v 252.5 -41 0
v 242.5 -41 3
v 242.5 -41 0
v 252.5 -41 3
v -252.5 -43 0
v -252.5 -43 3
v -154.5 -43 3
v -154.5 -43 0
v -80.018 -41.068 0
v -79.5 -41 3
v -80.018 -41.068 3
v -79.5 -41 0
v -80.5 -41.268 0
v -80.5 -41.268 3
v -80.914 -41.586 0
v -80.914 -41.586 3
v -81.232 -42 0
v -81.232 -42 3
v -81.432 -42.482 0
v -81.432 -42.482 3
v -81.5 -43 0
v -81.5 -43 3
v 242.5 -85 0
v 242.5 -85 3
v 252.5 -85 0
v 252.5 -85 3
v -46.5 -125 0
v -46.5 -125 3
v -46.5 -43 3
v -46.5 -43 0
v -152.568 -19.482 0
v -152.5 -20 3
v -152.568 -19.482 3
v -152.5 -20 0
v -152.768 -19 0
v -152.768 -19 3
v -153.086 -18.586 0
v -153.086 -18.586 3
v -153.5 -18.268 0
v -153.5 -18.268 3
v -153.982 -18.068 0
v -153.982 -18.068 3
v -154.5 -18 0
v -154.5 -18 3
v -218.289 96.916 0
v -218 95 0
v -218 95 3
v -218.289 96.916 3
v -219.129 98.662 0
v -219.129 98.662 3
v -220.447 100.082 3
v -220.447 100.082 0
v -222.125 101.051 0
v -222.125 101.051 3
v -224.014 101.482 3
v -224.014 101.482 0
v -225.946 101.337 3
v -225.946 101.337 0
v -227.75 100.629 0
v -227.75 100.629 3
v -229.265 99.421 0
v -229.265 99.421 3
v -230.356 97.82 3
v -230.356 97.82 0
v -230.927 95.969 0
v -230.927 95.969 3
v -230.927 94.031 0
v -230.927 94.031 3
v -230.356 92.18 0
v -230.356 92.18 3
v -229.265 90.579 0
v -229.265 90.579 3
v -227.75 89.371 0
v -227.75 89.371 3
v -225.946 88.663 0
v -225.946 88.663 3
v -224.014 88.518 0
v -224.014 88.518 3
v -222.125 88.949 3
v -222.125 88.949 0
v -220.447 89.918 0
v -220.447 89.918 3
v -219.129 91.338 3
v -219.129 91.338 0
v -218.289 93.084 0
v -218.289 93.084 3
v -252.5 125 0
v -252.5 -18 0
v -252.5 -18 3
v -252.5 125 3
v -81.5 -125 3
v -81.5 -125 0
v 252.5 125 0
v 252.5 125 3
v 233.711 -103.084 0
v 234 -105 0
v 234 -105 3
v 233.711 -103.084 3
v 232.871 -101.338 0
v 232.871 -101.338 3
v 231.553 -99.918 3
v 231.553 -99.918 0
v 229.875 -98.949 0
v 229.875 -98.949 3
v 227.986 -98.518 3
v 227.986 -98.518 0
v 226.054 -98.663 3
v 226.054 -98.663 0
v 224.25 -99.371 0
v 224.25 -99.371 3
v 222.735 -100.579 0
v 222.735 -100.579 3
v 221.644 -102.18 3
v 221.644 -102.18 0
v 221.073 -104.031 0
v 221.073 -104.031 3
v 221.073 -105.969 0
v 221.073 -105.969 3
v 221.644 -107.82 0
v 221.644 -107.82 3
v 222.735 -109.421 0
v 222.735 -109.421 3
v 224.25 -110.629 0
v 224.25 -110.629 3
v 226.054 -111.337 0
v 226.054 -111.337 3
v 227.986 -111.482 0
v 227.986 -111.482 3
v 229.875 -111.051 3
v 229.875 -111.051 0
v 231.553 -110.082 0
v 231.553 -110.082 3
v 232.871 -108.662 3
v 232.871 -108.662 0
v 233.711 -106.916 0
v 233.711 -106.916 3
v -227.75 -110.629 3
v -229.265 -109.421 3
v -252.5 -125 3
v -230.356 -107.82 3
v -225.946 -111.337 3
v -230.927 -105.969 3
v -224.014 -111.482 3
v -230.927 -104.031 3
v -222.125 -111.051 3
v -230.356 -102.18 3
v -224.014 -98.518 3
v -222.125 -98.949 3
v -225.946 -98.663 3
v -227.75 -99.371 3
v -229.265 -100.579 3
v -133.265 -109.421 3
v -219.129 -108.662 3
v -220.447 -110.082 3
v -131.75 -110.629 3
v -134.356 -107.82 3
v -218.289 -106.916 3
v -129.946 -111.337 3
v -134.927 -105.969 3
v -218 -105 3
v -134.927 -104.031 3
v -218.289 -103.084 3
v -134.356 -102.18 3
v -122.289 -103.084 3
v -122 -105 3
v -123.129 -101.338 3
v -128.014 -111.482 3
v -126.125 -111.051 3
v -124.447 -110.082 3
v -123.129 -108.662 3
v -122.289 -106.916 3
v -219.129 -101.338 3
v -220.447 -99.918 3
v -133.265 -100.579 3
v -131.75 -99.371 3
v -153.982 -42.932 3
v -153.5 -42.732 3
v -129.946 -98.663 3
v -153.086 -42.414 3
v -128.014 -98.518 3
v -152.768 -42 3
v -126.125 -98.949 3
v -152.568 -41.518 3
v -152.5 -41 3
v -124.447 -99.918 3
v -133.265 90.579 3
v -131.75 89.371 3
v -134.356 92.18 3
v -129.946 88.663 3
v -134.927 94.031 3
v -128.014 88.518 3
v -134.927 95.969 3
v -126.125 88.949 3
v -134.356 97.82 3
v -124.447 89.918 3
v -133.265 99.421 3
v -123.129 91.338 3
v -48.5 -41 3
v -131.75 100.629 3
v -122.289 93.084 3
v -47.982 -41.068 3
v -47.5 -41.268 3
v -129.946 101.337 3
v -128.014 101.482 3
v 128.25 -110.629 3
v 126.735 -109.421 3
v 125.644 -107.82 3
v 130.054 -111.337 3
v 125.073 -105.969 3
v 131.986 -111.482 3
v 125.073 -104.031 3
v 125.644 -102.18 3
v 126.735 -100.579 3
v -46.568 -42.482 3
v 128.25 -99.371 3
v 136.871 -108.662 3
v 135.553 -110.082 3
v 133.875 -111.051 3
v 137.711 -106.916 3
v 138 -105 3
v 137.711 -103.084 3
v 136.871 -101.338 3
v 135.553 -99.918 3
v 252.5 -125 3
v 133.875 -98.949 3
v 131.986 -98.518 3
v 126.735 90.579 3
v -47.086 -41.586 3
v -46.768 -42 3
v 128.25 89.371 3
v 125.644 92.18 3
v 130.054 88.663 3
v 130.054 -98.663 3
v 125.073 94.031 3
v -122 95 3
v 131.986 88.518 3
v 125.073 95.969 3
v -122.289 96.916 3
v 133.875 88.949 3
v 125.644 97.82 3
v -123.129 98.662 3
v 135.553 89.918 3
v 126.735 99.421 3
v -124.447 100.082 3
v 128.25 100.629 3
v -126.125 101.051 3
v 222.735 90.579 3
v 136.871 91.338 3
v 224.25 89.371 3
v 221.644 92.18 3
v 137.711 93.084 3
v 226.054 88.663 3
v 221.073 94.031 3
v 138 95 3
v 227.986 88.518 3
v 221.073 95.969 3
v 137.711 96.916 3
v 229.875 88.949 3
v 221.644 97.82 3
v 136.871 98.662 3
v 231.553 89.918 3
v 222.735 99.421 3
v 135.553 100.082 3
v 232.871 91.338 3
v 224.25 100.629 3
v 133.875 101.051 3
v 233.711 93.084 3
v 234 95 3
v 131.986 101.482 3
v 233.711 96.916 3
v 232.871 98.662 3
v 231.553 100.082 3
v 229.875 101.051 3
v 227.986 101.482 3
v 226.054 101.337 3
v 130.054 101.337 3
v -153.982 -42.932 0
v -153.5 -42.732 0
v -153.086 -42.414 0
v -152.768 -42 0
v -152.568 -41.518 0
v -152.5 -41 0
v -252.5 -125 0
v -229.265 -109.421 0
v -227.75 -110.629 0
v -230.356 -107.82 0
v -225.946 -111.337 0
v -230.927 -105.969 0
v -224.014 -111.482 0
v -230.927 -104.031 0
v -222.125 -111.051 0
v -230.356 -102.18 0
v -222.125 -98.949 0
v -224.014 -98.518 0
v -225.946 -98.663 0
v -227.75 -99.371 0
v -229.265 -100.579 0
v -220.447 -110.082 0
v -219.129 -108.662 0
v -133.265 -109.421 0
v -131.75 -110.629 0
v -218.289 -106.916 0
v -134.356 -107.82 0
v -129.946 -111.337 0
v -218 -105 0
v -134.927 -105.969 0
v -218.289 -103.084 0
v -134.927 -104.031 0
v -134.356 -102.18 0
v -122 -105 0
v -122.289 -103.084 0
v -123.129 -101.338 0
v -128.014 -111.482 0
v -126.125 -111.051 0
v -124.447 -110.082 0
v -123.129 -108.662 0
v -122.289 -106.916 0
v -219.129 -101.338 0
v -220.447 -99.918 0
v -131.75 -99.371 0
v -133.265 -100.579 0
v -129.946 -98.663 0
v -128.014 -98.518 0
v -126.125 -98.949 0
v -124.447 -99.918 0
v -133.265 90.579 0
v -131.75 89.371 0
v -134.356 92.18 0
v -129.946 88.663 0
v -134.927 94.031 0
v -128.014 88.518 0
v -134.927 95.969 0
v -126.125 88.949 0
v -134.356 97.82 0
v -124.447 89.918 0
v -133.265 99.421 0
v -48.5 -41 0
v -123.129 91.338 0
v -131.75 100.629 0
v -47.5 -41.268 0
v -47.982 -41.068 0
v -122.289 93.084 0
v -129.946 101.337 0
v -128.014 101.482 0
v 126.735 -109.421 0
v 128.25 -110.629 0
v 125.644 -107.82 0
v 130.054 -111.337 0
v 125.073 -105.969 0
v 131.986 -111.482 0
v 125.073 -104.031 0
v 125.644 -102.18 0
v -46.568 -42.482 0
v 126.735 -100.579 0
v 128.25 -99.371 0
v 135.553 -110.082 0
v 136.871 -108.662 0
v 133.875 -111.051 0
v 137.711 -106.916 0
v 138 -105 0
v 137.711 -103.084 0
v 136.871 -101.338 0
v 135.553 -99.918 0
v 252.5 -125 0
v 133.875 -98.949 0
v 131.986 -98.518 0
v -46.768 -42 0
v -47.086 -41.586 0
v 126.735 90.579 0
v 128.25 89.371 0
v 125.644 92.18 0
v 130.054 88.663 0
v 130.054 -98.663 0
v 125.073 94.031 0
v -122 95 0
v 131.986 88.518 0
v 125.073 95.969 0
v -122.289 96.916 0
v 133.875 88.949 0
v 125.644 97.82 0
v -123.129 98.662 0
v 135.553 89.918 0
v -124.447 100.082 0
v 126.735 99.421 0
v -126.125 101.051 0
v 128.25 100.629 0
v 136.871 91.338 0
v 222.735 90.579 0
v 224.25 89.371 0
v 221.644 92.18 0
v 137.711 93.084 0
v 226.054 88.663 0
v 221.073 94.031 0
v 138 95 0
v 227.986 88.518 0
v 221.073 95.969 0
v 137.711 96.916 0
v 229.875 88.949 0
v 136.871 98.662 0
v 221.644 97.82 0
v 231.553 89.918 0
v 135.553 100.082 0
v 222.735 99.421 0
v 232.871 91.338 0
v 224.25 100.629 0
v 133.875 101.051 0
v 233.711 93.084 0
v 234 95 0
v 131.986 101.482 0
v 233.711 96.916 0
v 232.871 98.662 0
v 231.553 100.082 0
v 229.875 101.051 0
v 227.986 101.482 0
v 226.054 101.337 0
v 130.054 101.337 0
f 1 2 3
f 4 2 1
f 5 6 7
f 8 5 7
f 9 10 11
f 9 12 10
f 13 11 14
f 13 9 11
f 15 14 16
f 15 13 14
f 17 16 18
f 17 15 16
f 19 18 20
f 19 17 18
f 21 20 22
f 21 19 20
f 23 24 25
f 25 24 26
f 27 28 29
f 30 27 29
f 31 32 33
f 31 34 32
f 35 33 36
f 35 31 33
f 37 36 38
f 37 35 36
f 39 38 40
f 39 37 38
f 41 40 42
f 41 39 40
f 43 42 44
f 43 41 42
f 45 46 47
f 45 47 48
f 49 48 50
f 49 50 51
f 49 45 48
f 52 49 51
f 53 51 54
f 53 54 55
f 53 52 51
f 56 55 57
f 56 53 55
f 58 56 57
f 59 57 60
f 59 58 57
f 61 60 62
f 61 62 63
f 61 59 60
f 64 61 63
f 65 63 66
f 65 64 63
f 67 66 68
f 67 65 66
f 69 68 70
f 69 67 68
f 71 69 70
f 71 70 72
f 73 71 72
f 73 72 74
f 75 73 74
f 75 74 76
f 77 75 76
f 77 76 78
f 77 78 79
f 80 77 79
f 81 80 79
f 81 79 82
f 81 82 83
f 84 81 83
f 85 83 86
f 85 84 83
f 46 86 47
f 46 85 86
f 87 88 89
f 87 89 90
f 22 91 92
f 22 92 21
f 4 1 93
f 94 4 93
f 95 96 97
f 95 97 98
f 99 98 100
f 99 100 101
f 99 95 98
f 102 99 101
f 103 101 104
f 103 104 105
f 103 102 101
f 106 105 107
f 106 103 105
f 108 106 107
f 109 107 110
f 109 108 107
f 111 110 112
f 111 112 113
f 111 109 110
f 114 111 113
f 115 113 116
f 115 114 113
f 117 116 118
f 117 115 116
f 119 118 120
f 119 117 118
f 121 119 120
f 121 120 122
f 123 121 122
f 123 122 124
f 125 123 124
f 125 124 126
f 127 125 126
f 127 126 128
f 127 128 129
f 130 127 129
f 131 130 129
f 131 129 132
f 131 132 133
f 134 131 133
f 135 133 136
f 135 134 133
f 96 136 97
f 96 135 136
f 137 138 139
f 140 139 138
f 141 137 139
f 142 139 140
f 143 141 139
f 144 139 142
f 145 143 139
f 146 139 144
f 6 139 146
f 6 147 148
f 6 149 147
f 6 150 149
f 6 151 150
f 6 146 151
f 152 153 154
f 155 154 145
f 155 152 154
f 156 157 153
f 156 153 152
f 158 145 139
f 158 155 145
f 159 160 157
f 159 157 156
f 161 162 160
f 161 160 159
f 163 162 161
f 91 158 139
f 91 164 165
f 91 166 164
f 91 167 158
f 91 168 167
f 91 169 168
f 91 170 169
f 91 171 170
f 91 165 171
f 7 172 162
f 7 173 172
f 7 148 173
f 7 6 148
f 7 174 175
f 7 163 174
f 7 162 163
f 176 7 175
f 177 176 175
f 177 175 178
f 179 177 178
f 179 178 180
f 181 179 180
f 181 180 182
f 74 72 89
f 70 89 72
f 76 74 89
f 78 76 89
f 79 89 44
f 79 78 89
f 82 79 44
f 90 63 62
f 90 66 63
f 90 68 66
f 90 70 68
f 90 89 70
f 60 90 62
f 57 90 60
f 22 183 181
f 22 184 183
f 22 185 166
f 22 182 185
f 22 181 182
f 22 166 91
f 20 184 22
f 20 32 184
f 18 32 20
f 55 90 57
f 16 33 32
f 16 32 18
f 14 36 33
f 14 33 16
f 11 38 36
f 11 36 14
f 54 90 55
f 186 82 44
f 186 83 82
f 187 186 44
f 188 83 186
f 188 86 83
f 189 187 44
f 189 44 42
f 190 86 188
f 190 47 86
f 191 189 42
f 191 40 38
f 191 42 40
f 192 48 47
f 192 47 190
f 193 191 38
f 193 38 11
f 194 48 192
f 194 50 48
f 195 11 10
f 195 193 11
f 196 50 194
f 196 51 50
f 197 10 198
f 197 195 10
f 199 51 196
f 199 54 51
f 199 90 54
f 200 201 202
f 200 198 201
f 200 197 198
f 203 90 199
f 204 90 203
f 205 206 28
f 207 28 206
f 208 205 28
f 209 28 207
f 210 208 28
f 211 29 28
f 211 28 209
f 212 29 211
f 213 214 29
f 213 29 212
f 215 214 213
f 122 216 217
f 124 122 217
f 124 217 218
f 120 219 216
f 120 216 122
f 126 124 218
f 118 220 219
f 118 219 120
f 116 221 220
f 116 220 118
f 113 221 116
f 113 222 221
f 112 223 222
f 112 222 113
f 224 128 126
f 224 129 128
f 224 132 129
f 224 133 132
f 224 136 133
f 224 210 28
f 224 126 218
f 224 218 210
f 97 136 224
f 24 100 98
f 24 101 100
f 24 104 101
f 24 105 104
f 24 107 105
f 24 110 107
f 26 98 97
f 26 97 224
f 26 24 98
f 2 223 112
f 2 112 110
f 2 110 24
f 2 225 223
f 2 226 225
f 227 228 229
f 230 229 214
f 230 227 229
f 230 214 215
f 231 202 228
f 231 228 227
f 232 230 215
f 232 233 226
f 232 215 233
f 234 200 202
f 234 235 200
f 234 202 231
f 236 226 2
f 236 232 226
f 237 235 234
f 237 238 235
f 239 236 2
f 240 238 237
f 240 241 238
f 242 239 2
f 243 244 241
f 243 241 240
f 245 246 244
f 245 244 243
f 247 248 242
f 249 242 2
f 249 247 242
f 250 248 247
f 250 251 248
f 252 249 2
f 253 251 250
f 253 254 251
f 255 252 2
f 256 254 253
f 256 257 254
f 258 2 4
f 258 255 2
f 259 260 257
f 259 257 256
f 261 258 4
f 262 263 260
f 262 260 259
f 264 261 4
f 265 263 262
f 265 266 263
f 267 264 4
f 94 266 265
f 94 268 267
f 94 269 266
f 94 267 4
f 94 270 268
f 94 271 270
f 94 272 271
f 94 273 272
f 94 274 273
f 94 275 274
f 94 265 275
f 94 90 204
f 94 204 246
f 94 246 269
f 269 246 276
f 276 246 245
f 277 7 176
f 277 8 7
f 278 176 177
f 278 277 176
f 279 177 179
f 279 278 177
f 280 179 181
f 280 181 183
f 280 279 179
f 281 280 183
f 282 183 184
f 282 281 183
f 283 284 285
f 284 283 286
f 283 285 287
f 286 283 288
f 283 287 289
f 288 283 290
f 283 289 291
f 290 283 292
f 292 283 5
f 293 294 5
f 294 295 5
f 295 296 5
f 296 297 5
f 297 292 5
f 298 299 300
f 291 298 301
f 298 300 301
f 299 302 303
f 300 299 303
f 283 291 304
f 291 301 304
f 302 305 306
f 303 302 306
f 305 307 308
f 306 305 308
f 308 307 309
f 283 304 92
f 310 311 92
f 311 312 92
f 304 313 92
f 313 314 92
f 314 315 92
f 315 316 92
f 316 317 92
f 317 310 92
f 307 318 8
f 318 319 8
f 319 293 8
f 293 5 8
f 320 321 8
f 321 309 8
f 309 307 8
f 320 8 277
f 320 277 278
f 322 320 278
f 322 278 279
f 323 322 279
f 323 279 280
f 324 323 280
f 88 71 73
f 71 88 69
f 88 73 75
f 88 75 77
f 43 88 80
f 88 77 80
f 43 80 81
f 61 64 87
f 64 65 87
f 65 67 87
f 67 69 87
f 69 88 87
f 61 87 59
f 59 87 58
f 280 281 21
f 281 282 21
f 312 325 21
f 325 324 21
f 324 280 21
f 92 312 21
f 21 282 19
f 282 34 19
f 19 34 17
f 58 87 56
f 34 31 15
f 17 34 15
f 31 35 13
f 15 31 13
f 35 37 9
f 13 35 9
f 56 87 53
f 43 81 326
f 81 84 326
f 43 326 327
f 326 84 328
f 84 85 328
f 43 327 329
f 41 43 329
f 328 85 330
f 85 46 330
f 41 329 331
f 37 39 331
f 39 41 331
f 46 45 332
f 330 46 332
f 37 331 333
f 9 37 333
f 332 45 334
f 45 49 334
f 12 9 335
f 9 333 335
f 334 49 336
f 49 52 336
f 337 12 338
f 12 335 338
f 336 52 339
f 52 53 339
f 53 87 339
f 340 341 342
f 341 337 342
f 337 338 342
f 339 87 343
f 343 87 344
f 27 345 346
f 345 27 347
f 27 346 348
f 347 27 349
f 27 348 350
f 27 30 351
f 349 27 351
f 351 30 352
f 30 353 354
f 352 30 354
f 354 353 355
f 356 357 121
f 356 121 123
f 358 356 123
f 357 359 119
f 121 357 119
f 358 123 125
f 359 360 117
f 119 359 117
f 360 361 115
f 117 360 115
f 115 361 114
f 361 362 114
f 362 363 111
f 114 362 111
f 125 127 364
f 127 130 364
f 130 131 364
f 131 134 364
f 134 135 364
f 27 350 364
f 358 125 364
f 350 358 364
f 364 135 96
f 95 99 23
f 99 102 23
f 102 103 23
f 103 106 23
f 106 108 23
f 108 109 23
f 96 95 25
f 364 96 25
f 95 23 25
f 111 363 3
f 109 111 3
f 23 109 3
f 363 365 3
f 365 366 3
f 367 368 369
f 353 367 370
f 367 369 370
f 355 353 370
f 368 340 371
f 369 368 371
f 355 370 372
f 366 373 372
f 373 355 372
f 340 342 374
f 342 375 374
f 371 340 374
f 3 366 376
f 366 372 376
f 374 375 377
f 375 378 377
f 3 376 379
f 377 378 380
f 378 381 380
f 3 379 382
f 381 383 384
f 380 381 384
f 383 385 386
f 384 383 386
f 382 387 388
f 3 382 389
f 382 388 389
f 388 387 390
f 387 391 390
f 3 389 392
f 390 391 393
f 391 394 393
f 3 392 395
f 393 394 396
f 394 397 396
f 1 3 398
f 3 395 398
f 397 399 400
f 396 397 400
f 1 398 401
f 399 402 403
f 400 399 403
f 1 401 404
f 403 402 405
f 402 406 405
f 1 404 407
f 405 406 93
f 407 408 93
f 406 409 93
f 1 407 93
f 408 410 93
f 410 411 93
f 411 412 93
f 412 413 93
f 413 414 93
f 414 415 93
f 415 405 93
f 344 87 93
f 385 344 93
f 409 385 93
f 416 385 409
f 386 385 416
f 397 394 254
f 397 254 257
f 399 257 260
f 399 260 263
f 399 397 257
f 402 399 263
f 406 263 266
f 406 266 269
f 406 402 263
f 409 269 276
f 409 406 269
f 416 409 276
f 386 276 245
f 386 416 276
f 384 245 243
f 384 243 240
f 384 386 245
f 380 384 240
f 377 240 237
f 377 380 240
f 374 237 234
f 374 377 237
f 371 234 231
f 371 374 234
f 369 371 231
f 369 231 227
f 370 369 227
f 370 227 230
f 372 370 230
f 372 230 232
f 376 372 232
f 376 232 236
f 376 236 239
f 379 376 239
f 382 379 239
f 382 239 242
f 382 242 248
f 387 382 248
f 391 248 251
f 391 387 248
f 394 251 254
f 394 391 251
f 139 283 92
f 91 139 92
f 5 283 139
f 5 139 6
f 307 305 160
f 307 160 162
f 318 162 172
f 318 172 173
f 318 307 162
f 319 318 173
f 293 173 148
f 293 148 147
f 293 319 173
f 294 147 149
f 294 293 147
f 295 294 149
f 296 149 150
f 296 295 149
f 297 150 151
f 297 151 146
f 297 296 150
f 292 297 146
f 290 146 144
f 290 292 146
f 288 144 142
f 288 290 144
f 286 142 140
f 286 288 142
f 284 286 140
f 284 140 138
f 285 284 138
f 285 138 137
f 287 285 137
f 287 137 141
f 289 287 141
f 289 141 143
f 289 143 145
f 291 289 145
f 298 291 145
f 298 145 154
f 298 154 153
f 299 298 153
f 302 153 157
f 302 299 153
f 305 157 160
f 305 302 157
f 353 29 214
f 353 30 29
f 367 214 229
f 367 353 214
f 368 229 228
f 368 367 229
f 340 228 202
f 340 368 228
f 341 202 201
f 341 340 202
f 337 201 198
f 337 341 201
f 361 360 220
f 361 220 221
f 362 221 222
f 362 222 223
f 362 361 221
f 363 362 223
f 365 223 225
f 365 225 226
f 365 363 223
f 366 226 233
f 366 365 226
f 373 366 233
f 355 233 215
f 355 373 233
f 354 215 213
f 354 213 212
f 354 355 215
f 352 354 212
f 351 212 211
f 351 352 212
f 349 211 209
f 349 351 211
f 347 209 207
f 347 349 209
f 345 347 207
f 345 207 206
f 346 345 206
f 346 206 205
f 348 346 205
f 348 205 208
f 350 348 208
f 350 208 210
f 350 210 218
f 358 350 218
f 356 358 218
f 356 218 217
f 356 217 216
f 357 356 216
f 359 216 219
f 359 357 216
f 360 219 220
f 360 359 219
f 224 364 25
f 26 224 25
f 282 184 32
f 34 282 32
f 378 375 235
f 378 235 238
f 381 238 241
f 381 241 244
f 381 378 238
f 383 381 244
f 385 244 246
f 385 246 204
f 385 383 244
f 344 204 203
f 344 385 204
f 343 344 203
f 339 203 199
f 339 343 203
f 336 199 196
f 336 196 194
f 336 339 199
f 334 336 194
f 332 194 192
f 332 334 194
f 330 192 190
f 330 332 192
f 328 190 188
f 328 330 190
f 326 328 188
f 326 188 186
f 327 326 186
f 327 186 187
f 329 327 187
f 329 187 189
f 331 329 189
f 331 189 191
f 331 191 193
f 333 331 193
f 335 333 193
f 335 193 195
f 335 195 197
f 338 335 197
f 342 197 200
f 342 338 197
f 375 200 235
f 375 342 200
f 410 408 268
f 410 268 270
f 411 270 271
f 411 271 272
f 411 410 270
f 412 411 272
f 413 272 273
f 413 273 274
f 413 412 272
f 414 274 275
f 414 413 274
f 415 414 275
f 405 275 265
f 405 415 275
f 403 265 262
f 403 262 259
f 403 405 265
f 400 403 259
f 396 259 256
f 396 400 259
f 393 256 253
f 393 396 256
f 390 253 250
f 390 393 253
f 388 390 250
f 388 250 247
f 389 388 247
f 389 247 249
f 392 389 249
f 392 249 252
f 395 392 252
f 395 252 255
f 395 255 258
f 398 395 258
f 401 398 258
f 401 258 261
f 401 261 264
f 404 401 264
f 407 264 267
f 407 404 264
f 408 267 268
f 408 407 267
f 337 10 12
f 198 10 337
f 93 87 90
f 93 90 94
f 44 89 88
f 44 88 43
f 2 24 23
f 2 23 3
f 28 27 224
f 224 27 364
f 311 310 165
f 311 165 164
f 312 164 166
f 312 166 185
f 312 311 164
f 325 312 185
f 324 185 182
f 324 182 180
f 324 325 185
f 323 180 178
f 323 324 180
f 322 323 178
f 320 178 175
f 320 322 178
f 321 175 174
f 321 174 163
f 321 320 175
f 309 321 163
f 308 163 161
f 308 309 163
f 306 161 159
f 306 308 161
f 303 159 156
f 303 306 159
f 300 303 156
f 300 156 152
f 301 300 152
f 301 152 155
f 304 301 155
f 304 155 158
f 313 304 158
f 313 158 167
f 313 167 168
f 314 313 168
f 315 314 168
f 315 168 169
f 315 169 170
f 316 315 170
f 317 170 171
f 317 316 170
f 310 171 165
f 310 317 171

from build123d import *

# Parameters (mm, degrees)
ESQUISSE1_W             = 505
ESQUISSE1_H             = 250
ESQUISSE1_R             = 6.5
BOSS_EXTRU_1_DEPTH      = 3
ESQUISSE4_W             = 100
ESQUISSE4_H             = 25
ESQUISSE4_W_2           = 35
ESQUISSE4_H_2           = 84
ESQUISSE4_W_3           = 10
ESQUISSE4_H_3           = 44
ENL_V_MAT_EXTRU_3_DEPTH = 10
CONG_1_R                = 2


with BuildPart() as part:
    # Esquisse1 → Boss.-Extru.1 (new body)
    with BuildSketch(Plane.XY):
        Rectangle(ESQUISSE1_W, ESQUISSE1_H)
        with Locations((131.5, 95)):
            Circle(ESQUISSE1_R, mode=Mode.SUBTRACT)
        with Locations((227.5, 95)):
            Circle(ESQUISSE1_R, mode=Mode.SUBTRACT)
        with Locations((131.5, -105)):
            Circle(ESQUISSE1_R, mode=Mode.SUBTRACT)
        with Locations((227.5, -105)):
            Circle(ESQUISSE1_R, mode=Mode.SUBTRACT)
        with Locations((-128.5, -105)):
            Circle(ESQUISSE1_R, mode=Mode.SUBTRACT)
        with Locations((-128.5, 95)):
            Circle(ESQUISSE1_R, mode=Mode.SUBTRACT)
        with Locations((-224.5, 95)):
            Circle(ESQUISSE1_R, mode=Mode.SUBTRACT)
        with Locations((-224.5, -105)):
            Circle(ESQUISSE1_R, mode=Mode.SUBTRACT)
    extrude(amount=BOSS_EXTRU_1_DEPTH)

    # Esquisse4 → Enlèv. mat.-Extru.3 (cut)
    with BuildSketch(Plane.XY.offset(3)):
        with Locations((-202.5, -30.5)):
            Rectangle(ESQUISSE4_W, ESQUISSE4_H)
        with Locations((-64, -83)):
            Rectangle(ESQUISSE4_W_2, ESQUISSE4_H_2)
        with Locations((247.5, -63)):
            Rectangle(ESQUISSE4_W_3, ESQUISSE4_H_3)
    extrude(amount=-ENL_V_MAT_EXTRU_3_DEPTH, mode=Mode.SUBTRACT)

    # Congé1
    cong_1_edges = [part.edges().sort_by_distance(p)[0] for p in [
        (-152.5, -18, 1.5),
        (-152.5, -43, 1.5),
        (-81.5, -41, 1.5),
        (-46.5, -41, 1.5),
    ]]
    fillet(cong_1_edges, radius=CONG_1_R)


solid = part.part
